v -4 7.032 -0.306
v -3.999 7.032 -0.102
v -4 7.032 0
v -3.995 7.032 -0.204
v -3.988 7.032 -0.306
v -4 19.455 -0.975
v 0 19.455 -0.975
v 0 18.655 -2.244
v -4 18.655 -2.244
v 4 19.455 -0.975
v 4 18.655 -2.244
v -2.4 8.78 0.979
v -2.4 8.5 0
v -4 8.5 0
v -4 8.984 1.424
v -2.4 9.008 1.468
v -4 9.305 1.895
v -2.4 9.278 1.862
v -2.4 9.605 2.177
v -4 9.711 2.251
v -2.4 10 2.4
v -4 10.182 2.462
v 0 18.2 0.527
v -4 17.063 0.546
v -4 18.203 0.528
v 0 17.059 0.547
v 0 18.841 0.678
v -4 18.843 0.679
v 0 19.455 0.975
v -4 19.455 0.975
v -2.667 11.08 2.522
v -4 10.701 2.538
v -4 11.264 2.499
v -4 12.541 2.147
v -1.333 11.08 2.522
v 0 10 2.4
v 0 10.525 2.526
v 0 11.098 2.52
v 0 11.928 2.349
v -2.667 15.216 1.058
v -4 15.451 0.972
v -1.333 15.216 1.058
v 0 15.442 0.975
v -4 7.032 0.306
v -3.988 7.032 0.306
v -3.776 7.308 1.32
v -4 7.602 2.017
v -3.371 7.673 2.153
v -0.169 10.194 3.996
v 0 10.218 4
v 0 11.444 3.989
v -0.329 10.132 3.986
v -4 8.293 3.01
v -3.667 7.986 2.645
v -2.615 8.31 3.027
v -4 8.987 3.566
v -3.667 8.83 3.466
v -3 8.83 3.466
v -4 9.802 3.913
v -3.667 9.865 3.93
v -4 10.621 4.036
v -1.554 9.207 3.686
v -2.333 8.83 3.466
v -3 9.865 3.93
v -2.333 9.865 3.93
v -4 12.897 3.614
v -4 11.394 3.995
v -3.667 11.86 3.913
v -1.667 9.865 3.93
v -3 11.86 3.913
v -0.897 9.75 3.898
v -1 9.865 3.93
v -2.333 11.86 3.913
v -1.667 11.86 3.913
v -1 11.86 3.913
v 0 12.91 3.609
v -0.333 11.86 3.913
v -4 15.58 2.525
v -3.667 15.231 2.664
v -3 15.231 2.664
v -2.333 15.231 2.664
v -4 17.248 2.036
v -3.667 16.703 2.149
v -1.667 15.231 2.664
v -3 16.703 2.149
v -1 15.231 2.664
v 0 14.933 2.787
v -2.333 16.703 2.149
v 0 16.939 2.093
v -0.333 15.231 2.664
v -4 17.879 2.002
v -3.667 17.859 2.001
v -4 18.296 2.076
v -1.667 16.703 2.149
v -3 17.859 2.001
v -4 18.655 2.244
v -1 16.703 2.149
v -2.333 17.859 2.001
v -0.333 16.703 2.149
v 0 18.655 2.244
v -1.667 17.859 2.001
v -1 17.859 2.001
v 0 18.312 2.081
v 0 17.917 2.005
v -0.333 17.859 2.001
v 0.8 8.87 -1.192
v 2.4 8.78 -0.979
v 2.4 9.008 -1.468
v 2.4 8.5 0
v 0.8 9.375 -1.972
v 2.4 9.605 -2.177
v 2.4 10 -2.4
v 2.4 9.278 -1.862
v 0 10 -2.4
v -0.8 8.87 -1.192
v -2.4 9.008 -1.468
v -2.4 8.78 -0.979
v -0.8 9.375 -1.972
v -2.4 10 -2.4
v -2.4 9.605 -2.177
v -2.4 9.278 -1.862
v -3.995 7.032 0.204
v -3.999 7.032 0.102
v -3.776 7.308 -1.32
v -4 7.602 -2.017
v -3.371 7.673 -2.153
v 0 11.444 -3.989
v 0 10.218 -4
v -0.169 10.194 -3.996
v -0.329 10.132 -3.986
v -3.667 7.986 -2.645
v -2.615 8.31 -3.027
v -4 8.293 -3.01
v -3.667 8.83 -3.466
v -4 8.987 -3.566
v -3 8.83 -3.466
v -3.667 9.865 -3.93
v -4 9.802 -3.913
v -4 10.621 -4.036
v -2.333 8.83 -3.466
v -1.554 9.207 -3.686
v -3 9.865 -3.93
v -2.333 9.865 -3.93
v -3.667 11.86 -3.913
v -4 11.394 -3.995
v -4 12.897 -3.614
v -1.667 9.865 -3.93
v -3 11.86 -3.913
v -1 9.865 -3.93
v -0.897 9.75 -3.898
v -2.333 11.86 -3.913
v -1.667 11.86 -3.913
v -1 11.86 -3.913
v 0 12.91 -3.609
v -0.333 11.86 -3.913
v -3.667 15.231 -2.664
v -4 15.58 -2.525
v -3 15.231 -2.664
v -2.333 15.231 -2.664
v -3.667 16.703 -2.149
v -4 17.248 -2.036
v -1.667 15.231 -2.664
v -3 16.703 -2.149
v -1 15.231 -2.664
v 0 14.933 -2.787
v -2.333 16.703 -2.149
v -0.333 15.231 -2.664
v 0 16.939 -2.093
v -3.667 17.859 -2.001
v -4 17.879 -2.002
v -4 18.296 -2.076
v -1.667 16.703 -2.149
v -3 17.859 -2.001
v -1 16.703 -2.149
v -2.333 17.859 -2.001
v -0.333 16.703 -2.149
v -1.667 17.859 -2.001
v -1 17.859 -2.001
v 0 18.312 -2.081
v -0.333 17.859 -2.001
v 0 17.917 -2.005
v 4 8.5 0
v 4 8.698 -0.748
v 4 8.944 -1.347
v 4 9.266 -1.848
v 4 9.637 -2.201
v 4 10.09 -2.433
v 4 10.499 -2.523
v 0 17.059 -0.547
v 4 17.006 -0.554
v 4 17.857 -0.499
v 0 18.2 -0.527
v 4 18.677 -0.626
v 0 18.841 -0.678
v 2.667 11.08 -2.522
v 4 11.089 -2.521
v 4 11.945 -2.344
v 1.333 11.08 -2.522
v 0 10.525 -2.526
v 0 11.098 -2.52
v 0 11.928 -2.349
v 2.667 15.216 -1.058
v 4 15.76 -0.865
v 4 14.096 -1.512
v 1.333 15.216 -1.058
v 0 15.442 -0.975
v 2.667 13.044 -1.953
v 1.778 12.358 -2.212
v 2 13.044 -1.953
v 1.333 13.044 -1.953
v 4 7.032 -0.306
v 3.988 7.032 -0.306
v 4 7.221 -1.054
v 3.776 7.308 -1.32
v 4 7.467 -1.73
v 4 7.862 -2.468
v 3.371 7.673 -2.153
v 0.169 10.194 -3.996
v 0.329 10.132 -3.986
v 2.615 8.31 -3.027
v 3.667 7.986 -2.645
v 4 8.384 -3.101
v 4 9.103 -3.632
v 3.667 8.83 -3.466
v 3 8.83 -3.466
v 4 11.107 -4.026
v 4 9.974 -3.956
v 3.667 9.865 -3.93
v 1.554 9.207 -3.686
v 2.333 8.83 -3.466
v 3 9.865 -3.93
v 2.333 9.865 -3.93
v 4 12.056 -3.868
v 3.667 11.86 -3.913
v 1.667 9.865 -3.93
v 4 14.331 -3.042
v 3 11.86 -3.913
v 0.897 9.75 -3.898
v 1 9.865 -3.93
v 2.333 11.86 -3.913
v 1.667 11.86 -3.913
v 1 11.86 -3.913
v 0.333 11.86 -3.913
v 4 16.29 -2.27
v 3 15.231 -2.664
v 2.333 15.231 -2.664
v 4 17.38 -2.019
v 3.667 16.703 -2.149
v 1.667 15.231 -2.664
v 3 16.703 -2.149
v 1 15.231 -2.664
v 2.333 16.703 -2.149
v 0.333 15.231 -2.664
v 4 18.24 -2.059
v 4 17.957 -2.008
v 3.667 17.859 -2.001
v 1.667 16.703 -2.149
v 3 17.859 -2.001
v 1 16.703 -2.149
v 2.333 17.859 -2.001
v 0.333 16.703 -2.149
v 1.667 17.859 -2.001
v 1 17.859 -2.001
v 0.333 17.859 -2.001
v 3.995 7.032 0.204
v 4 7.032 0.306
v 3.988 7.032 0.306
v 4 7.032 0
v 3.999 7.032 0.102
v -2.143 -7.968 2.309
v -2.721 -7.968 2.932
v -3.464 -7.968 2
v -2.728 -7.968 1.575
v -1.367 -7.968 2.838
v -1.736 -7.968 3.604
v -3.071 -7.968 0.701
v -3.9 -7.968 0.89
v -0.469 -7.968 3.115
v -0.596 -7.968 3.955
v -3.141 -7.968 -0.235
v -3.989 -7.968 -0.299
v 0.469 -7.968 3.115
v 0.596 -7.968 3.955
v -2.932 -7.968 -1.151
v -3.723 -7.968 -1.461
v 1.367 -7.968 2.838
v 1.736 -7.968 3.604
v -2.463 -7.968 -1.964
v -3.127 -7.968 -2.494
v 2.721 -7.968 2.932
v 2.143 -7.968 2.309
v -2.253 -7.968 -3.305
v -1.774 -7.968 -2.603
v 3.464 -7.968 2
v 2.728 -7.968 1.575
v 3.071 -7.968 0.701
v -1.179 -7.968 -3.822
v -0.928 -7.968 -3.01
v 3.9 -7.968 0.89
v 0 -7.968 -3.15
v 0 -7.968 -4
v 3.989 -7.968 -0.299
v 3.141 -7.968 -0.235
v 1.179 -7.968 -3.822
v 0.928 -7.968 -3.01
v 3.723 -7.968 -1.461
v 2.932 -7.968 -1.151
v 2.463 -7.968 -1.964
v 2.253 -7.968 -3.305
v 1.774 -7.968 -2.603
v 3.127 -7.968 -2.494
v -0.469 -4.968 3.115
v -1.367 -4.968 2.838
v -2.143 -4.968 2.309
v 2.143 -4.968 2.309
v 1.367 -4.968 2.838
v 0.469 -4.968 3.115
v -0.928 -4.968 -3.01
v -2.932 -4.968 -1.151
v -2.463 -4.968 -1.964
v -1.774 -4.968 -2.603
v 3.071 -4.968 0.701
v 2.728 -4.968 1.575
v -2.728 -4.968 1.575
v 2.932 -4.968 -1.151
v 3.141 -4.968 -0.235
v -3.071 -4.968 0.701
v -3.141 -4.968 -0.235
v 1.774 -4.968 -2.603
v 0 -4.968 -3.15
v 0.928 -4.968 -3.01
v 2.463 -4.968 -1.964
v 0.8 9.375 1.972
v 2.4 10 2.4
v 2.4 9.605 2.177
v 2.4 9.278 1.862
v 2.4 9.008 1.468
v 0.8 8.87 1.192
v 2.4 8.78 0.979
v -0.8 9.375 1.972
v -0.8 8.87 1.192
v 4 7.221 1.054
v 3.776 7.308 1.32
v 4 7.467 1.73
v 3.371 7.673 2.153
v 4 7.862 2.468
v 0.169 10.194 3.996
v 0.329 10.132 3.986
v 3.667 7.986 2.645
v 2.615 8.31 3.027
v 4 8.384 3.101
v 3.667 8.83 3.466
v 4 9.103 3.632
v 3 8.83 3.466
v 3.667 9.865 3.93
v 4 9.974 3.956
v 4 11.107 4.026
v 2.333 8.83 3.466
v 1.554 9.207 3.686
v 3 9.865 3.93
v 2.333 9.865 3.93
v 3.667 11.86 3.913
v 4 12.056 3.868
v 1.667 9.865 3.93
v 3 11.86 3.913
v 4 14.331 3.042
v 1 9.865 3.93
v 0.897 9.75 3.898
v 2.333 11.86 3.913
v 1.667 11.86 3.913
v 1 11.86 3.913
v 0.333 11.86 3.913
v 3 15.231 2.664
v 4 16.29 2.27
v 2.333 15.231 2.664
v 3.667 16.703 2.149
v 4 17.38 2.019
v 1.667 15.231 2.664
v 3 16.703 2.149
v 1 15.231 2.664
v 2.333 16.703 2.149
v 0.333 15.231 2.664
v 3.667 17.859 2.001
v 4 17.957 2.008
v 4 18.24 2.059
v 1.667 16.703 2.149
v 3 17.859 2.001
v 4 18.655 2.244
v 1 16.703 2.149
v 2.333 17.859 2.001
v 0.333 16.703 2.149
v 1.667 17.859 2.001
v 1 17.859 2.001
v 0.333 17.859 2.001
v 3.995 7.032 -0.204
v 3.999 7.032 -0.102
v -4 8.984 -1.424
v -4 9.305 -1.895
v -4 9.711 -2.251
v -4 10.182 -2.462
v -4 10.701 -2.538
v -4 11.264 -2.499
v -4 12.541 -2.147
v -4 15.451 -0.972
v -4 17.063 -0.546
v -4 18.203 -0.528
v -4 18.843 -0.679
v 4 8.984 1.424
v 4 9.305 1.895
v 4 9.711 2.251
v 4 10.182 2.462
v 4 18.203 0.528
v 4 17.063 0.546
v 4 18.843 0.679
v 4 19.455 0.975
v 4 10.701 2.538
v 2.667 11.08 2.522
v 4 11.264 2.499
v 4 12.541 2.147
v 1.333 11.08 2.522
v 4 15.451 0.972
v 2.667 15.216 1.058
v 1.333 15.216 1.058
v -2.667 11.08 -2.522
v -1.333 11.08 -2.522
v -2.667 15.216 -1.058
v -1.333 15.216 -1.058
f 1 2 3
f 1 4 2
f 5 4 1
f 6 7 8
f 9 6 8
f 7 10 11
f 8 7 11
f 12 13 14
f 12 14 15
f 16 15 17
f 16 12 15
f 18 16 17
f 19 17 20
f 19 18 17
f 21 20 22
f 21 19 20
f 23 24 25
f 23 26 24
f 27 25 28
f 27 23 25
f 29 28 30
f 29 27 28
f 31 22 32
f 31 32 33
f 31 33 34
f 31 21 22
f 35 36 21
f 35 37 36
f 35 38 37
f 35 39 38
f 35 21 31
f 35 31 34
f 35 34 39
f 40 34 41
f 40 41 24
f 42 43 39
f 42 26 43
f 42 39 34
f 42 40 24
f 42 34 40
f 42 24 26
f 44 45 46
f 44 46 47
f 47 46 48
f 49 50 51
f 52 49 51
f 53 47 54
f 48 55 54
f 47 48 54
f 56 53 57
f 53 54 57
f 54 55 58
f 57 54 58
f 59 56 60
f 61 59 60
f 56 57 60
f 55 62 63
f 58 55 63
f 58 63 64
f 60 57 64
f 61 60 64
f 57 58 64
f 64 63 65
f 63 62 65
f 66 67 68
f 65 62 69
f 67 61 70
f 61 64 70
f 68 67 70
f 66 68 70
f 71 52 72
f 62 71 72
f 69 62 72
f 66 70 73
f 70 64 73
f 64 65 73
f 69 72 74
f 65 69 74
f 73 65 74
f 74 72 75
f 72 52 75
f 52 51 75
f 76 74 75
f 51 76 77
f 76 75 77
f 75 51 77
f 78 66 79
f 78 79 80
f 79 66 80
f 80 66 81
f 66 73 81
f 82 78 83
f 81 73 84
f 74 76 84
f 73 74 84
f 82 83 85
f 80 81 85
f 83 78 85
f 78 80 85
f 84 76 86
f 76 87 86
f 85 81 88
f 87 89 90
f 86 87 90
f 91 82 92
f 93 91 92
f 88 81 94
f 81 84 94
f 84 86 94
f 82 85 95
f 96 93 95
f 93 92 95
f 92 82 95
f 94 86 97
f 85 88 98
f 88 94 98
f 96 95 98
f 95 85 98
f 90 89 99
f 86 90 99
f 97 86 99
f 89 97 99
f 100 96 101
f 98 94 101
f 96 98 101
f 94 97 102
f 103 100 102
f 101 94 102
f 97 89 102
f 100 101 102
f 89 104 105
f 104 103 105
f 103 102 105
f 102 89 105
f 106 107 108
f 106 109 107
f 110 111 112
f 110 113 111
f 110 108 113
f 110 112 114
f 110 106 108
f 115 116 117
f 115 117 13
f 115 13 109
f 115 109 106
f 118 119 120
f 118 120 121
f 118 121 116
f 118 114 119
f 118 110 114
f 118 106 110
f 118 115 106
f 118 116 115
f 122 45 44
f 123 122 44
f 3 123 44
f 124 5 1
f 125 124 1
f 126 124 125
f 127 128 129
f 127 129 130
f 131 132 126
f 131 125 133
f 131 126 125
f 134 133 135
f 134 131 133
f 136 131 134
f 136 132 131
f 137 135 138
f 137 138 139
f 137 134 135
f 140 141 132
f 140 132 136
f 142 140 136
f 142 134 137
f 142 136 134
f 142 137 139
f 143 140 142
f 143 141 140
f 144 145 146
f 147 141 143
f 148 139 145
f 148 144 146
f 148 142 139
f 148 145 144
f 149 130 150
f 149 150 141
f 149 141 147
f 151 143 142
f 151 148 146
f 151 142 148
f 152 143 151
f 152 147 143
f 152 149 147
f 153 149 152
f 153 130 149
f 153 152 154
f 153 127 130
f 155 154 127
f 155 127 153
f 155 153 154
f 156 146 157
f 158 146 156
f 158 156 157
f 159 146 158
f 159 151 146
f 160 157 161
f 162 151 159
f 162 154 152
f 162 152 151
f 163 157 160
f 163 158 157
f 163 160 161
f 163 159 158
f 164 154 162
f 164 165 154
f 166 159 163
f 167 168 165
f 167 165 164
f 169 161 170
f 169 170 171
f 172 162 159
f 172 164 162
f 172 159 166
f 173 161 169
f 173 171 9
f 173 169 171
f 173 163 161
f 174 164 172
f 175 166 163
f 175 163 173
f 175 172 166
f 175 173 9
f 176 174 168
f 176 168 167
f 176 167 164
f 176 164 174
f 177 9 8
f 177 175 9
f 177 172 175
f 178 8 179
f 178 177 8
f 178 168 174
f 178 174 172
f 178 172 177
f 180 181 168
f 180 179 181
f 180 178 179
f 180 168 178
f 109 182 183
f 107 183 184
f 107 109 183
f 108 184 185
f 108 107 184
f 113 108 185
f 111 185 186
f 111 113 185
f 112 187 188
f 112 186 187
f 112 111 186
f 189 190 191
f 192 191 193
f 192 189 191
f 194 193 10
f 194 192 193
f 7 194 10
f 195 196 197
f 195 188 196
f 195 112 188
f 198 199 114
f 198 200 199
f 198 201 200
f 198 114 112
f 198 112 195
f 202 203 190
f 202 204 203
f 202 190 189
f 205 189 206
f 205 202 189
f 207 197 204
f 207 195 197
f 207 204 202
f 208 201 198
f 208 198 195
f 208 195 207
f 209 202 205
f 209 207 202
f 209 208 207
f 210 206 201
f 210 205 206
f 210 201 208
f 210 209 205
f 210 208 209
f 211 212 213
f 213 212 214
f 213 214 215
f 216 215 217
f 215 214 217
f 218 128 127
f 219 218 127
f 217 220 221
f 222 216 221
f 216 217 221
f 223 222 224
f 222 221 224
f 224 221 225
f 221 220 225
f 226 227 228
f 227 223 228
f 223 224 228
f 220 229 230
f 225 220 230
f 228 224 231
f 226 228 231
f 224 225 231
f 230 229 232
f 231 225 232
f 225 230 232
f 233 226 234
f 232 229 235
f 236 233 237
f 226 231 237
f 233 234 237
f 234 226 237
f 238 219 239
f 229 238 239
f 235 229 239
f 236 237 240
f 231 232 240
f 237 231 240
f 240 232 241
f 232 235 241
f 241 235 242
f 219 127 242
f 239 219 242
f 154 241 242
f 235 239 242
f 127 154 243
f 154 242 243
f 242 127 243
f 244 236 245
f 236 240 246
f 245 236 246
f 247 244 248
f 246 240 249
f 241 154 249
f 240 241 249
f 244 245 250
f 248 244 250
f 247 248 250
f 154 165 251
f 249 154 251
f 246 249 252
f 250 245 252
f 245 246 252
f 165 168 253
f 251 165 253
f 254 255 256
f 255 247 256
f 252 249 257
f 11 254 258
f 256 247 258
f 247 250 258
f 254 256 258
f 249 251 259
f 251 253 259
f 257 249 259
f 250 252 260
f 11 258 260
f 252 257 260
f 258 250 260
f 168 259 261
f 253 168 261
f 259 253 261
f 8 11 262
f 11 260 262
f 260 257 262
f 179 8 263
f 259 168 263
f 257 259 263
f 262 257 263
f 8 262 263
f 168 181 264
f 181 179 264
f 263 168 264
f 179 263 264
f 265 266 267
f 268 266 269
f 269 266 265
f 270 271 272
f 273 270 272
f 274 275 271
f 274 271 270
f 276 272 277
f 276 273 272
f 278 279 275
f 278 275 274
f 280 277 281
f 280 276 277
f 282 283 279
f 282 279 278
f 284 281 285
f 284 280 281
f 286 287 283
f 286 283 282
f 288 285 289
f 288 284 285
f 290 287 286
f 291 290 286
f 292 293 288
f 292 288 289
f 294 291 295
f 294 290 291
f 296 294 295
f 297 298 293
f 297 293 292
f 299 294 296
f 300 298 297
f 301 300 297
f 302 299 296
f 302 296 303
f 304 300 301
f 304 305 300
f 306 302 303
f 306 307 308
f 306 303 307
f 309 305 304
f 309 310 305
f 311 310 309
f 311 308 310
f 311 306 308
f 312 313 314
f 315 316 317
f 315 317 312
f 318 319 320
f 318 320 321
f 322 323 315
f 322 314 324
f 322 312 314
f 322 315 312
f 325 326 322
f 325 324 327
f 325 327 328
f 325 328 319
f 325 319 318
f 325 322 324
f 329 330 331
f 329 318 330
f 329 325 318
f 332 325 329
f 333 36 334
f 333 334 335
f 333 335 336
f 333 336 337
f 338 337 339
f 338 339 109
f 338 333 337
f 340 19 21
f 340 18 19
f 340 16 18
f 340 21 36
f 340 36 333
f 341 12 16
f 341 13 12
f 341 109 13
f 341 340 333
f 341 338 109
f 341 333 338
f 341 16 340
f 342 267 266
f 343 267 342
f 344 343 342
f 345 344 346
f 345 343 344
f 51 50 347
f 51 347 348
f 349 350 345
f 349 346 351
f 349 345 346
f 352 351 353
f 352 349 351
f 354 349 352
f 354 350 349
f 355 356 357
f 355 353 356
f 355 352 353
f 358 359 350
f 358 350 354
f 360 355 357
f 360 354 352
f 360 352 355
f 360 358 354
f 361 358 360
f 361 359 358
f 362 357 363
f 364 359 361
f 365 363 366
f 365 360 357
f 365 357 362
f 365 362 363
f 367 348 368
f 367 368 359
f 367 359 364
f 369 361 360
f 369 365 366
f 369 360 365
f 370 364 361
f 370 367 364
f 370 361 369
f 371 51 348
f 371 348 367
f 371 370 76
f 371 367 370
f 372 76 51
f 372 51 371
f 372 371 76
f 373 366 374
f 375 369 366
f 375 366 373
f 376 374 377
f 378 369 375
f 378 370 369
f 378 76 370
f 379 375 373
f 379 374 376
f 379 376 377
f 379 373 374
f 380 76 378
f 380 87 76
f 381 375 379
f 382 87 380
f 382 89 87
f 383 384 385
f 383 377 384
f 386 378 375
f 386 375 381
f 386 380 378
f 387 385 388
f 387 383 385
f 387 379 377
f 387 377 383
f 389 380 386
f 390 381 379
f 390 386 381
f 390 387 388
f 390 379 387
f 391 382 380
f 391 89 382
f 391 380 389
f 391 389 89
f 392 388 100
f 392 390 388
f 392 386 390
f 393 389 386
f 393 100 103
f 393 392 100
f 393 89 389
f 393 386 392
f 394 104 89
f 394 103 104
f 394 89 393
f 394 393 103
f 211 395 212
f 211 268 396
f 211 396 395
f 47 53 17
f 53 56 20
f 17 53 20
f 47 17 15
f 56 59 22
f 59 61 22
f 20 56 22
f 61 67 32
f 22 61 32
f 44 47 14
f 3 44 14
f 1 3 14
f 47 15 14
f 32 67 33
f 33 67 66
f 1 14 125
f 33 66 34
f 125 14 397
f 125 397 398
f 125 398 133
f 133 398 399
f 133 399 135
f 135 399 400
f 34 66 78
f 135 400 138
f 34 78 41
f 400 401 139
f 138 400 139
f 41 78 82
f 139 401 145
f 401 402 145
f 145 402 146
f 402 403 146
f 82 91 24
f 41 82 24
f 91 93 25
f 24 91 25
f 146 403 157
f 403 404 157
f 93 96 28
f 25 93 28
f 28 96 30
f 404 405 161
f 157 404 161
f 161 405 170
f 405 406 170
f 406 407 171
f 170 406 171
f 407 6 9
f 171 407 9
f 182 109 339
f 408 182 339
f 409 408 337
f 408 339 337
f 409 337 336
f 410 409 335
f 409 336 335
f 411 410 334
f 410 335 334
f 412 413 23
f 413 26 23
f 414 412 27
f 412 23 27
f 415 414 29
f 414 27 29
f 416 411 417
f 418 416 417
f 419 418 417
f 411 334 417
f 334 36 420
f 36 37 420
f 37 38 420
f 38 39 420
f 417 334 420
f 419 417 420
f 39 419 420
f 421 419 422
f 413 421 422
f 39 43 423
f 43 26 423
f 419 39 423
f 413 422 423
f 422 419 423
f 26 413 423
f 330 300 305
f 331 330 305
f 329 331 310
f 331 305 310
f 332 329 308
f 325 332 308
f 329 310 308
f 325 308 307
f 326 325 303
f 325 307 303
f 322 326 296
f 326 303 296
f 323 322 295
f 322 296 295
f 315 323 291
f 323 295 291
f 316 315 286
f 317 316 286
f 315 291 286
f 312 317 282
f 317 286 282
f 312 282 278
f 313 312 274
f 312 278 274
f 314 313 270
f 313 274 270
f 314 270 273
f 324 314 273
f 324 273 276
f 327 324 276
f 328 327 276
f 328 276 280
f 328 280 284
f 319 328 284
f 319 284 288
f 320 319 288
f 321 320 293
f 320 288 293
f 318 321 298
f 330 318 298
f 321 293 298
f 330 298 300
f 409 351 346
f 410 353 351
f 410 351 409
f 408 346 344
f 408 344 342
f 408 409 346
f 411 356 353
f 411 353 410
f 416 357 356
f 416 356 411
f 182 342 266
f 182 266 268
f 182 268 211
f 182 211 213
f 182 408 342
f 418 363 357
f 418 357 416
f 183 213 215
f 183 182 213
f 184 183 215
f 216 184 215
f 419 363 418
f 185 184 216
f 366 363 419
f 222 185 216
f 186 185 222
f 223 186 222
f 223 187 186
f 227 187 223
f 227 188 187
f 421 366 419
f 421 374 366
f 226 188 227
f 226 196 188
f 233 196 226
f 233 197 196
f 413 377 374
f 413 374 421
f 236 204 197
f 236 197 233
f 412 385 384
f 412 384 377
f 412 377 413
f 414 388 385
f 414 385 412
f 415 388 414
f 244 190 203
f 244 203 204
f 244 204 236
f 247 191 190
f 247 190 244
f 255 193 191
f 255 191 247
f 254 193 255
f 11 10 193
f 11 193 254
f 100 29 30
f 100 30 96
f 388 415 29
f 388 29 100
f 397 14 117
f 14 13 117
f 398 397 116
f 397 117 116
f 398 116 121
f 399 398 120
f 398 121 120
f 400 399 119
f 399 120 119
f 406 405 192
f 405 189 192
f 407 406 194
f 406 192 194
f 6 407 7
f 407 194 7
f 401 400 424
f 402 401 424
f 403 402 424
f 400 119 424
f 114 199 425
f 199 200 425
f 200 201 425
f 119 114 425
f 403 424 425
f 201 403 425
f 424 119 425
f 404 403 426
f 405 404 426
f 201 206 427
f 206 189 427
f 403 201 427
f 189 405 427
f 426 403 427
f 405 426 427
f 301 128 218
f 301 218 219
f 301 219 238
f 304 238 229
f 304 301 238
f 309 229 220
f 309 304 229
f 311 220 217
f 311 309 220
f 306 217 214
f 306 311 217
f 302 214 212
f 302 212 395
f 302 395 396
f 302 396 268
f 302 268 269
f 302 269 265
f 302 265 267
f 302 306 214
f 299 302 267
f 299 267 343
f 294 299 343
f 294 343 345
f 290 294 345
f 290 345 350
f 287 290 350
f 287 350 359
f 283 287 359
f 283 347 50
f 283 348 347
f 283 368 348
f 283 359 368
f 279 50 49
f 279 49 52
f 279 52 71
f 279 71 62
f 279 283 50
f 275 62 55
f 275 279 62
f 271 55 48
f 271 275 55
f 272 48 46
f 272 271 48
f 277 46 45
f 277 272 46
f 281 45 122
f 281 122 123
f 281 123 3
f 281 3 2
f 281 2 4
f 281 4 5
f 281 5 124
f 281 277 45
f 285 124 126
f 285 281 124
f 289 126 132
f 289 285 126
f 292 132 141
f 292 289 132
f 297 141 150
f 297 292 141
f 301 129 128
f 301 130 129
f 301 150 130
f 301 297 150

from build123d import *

# Parameters (mm, degrees)
SKETCH2_W           = 4.8
SKETCH2_H           = 4.8
BOSS_EXTRUDE1_DEPTH = 10
BOSS_EXTRUDE2_DEPTH = 4
CUT_EXTRUDE2_DEPTH  = 13
CHAMFER2_SIZE       = 1
CUT_EXTRUDE3_DEPTH  = 10
BOSS_EXTRUDE4_REACH = 30.006
SKETCH8_R           = 4
SKETCH9_R           = 3.15
CUT_EXTRUDE4_DEPTH  = 3


with BuildPart() as part:
    # Sketch2 → Boss-Extrude1 (new body)
    with BuildSketch(Plane(origin=(0, 0, 0), x_dir=(1, 0, 0), z_dir=(0, 1, 0))):
        Rectangle(SKETCH2_W, SKETCH2_H)
    extrude(amount=BOSS_EXTRUDE1_DEPTH)

    # Sketch3 → Boss-Extrude2 (add, symmetric)
    with BuildSketch(Plane(origin=(0, 0, 0), x_dir=(0, 0, -1), z_dir=(1, 0, 0))):
        with BuildLine():
            Line((0.975338076, 19.454930534), (2.244202659, 18.654941366))
            add(Edge.make_bspline(
                [(0.30648988, 7.031645835), (0.529978824, 7.07829473), (0.984294969, 7.190115645), (1.788597583, 7.465388749), (2.682183374, 7.937701579), (3.530088414, 8.792890438), (3.993751964, 9.86950816), (4.073268982, 10.920061697), (3.885357462, 12.187039531), (3.360108624, 13.61802638), (2.635999183, 15.252362125), (2.079934075, 16.758846516), (1.937481109, 17.932951534), (2.096258838, 18.420287345), (2.244202659, 18.654941366)],
                knots=[0, 0, 0, 0, 0.03125, 0.0625, 0.125, 0.1875, 0.25, 0.3125, 0.375, 0.5, 0.625, 0.75, 0.875, 1, 1, 1, 1], degree=3))
            Line((0.30648988, 7.031645835), (0, 7.031645835))
            Line((0, 7.031645835), (0, 8.5))
            add(Edge.make_bspline(
                [(0, 8.5), (6.305568428, 9.816162649), (-1.423122637, 15.650726713), (0.975338076, 19.454930534)],
                knots=[0, 0, 0, 0, 1, 1, 1, 1], degree=3))
        make_face()
    boss_extrude2 = extrude(amount=BOSS_EXTRUDE2_DEPTH, both=True)

    # Mirror2: Boss-Extrude2 across plane
    add(boss_extrude2.mirror(Plane.XY))

    # Sketch4 → Cut-Extrude2 (cut)
    with BuildSketch(Plane.ZY.offset(4)):
        with BuildLine():
            Line((2.4, 10), (-2.4, 10))
            add(Edge.make_bspline(
                [(0, 8.5), (-1.418719804, 8.796129689), (-2.126988365, 9.320992778), (-2.4, 10)],
                knots=[0.775005248, 0.775005248, 0.775005248, 0.775005248, 1, 1, 1, 1], degree=3))
            add(Edge.make_bspline(
                [(2.4, 10), (2.126988365, 9.320992778), (1.418719804, 8.796129689), (0, 8.5)],
                knots=[0.775005248, 0.775005248, 0.775005248, 0.775005248, 1, 1, 1, 1], degree=3))
        make_face()
    extrude(amount=-CUT_EXTRUDE2_DEPTH, mode=Mode.SUBTRACT)

    # Chamfer2
    chamfer2_edges = [part.edges().sort_by_distance(p)[0] for p in [
        (0, 0, 2.4),
        (-2.4, 0, 0),
        (0, 0, -2.4),
        (2.4, 0, 0),
    ]]
    chamfer(chamfer2_edges, length=CHAMFER2_SIZE)

    # Sketch7 → Cut-Extrude3 (cut)
    with BuildSketch(Plane(origin=(4, 0, 0), x_dir=(0, 0, -1), z_dir=(1, 0, 0))):
        with BuildLine():
            Line((-0.30648988, 7.031645835), (0.30648988, 7.031645835))
            add(Edge.make_bspline(
                [(0.30648988, 7.031645835), (0.529978824, 7.07829473), (0.984294969, 7.190115645), (1.688906484, 7.431269404), (2.145705095, 7.657210623), (2.4, 7.818172285)],
                knots=[0, 0, 0, 0, 0.03125, 0.0625, 0.109506593, 0.109506593, 0.109506593, 0.109506593], degree=3))
            Line((2.4, 7.818172285), (2.4, 0))
            Line((2.4, 0), (-2.4, 0))
            Line((-2.4, 0), (-2.4, 7.818172285))
            add(Edge.make_bspline(
                [(-0.30648988, 7.031645835), (-0.529978824, 7.07829473), (-0.984294969, 7.190115645), (-1.688906484, 7.431269404), (-2.145705095, 7.657210623), (-2.4, 7.818172285)],
                knots=[0, 0, 0, 0, 0.03125, 0.0625, 0.109506593, 0.109506593, 0.109506593, 0.109506593], degree=3))
        make_face()
    extrude(amount=-CUT_EXTRUDE3_DEPTH, mode=Mode.SUBTRACT)

    # Sketch8 → Boss-Extrude4 (add, up to next)
    with BuildSketch(Plane(origin=(0, -7.968354165, 0), x_dir=(-1, 0, 0), z_dir=(0, -1, 0)), mode=Mode.PRIVATE) as boss_extrude4_sk1:
        with Locations(Location((0, 0, 0), (0, 0, 90))):
            Circle(SKETCH8_R)
    boss_extrude4_tool1 = extrude(boss_extrude4_sk1.sketch, amount=-BOSS_EXTRUDE4_REACH, mode=Mode.PRIVATE) - part.part
    add(boss_extrude4_tool1.solids().sort_by_distance((0, -7.968354, 0))[0])

    # Sketch9 → Cut-Extrude4 (cut)
    with BuildSketch(Plane.XZ.offset(7.968354165)):
        with Locations(Location((0, 0, 0), (0, 0, 270))):
            Circle(SKETCH9_R)
    extrude(amount=-CUT_EXTRUDE4_DEPTH, mode=Mode.SUBTRACT)


solid = part.part
